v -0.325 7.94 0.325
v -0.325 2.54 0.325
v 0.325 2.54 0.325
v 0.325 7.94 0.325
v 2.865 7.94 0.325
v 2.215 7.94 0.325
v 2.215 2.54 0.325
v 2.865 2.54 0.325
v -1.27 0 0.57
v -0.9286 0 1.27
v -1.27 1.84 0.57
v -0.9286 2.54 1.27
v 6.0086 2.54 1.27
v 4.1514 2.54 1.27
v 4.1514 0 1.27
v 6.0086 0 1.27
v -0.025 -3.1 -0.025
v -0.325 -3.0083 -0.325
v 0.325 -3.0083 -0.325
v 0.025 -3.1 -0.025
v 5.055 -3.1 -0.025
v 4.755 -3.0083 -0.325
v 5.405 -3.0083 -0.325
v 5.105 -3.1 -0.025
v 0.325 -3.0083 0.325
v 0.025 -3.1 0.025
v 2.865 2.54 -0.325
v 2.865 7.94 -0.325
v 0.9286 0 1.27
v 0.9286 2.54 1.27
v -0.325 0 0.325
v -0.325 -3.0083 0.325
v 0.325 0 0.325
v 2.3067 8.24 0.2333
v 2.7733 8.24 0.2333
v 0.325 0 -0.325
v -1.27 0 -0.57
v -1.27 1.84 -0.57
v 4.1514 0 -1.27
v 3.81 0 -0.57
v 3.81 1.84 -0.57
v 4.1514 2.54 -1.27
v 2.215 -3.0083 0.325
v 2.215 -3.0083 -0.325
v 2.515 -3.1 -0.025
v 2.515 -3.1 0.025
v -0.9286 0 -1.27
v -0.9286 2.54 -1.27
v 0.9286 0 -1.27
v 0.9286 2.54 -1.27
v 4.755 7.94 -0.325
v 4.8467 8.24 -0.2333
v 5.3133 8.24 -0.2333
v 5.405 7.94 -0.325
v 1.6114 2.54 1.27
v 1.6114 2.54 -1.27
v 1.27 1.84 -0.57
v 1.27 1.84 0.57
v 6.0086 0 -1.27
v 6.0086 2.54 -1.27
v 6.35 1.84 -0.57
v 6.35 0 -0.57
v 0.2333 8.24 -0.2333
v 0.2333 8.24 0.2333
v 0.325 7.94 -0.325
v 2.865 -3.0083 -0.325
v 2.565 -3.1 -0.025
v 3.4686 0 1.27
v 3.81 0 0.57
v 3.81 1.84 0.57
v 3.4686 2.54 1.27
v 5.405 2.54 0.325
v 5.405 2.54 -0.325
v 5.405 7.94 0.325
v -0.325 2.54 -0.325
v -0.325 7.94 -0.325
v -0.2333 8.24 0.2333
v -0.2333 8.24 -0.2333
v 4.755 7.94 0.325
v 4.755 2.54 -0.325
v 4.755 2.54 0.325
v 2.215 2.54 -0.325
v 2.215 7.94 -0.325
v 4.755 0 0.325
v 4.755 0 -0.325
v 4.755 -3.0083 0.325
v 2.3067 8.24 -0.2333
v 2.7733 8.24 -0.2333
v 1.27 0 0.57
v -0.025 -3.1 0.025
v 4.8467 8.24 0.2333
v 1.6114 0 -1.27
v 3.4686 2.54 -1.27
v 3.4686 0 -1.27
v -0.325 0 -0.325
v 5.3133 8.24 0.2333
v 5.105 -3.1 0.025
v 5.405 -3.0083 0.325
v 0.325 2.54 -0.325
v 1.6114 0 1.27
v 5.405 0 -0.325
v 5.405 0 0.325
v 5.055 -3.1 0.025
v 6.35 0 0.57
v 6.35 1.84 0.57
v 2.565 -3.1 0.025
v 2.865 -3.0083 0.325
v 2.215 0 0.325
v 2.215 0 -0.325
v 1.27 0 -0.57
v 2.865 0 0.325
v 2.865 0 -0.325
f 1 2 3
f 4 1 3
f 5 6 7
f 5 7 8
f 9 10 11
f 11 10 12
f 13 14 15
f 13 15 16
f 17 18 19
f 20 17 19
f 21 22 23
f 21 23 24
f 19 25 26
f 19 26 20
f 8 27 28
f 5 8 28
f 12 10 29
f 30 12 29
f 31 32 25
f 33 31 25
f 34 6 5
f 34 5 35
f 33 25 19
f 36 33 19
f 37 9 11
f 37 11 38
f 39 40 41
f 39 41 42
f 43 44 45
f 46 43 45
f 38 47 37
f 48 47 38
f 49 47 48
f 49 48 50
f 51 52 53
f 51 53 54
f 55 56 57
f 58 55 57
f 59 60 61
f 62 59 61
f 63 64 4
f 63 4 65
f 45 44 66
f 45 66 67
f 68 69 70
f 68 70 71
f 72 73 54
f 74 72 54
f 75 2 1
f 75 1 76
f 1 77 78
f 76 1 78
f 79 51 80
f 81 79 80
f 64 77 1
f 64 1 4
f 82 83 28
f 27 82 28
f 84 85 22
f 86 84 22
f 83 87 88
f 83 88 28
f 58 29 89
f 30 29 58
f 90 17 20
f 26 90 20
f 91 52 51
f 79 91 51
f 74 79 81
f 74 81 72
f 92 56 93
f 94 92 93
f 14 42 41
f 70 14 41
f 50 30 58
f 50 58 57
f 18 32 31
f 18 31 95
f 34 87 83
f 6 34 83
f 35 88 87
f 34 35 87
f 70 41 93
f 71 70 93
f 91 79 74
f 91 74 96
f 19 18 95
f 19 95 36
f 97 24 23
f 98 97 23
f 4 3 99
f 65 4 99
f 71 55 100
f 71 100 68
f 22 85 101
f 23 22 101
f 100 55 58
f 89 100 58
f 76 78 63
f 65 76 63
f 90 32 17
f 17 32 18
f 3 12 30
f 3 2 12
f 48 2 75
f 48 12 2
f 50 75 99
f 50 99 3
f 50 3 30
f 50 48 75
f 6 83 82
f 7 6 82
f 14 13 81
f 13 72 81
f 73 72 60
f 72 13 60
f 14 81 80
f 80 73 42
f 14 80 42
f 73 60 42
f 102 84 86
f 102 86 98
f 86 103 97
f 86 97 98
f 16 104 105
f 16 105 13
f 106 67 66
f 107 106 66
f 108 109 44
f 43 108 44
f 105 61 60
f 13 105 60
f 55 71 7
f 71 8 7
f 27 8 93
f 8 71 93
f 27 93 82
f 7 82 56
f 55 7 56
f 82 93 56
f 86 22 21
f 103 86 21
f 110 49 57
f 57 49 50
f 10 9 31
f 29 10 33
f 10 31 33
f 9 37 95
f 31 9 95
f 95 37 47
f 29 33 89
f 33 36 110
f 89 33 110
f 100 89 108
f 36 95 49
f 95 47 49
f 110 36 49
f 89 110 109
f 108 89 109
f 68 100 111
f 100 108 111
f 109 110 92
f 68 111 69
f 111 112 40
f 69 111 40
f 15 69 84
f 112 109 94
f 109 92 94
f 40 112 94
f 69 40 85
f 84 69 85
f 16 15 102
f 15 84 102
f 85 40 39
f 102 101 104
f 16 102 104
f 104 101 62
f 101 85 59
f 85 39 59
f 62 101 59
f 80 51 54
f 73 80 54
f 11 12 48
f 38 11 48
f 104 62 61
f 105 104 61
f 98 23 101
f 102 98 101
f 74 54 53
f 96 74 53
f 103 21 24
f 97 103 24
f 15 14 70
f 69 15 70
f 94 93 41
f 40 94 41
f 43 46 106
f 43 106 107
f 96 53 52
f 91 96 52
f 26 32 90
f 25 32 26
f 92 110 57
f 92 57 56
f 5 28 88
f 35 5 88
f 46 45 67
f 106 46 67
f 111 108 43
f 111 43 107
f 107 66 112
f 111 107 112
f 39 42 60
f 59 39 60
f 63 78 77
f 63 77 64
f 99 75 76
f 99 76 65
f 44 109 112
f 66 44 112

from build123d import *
from OCP.BRepFilletAPI import BRepFilletAPI_MakeChamfer

# Parameters (mm, degrees)
SKETCH1_W                    = 2.54
SKETCH1_H                    = 2.54
BOSS_EXTRUDE1_DEPTH          = 2.54
BOSS_EXTRUDE2_START          = -5.64
SKETCH2_W                    = 0.65
SKETCH2_H                    = 0.65
BOSS_EXTRUDE2_DEPTH          = 11.34
CHAMFER1_SIZE                = 0.3
CHAMFER1_SIZE2               = 0.091719204
CHAMFER3_SIZE                = 0.7
CHAMFER3_SIZE2               = 0.341412812
CHAMFER4_SIZE                = 0.7
CHAMFER4_SIZE2               = 0.341412812
R_P_TITION_START             = -1.27
R_P_TITION_LIN_AIRE3_DEPTH   = 2.54
R_P_TITION_START_2           = -0.325
R_P_TITION_LIN_AIRE3_2_DEPTH = 0.65
R_P_TITION_START_3           = 1.611412812
R_P_TITION_LIN_AIRE3_3_DEPTH = 4.397174376
R_P_TITION_START_4           = -1
R_P_TITION_LIN_AIRE3_4_DEPTH = 5


with BuildPart() as part:
    # Sketch1 → Boss-Extrude1 (new body)
    with BuildSketch(Plane(origin=(0, 0, 0), x_dir=(1, 0, 0), z_dir=(0, 1, 0))):
        Rectangle(SKETCH1_W, SKETCH1_H)
    extrude(amount=BOSS_EXTRUDE1_DEPTH)

    # Sketch2 → Boss-Extrude2 (add)
    with BuildSketch(Plane(origin=(0, 2.54, 0), x_dir=(1, 0, 0), z_dir=(0, 1, 0)).offset(BOSS_EXTRUDE2_START)):
        Rectangle(SKETCH2_W, SKETCH2_H)
    extrude(amount=BOSS_EXTRUDE2_DEPTH)

    # Chamfer1: one chamfer whose edges measure the first distance from different faces: ONE call of the kernel's chamfer builder (chamfer() names one face for all edges)
    chamfer1_edges_1 = [part.edges().sort_by_distance(p)[0] for p in [
        (-0.325, -3.1, 0),
        (0, -3.1, -0.325),
        (0.325, -3.1, 0),
        (0, -3.1, 0.325),
    ]]
    chamfer1_side_1 = [part.faces().sort_by_distance(p)[0] for p in [
        (0, -3.1, 0),
    ]]
    chamfer1_edges_2 = [part.edges().sort_by_distance(p)[0] for p in [
        (-0.325, 8.24, 0),
    ]]
    chamfer1_side_2 = [part.faces().sort_by_distance(p)[0] for p in [
        (-0.325, 5.39, 0),
    ]]
    chamfer1_edges_3 = [part.edges().sort_by_distance(p)[0] for p in [
        (0, 8.24, 0.325),
    ]]
    chamfer1_side_3 = [part.faces().sort_by_distance(p)[0] for p in [
        (0, 5.39, 0.325),
    ]]
    chamfer1_edges_4 = [part.edges().sort_by_distance(p)[0] for p in [
        (0.325, 8.24, 0),
    ]]
    chamfer1_side_4 = [part.faces().sort_by_distance(p)[0] for p in [
        (0.325, 5.39, 0),
    ]]
    chamfer1_edges_5 = [part.edges().sort_by_distance(p)[0] for p in [
        (0, 8.24, -0.325),
    ]]
    chamfer1_side_5 = [part.faces().sort_by_distance(p)[0] for p in [
        (0, 5.39, -0.325),
    ]]
    chamfer1 = BRepFilletAPI_MakeChamfer(part.part.solid().wrapped)
    for e in chamfer1_edges_1:
        chamfer1.Add(CHAMFER1_SIZE, CHAMFER1_SIZE2, e.wrapped, chamfer1_side_1[0].wrapped)  # the first distance lies on this face
    for e in chamfer1_edges_2:
        chamfer1.Add(CHAMFER1_SIZE, CHAMFER1_SIZE2, e.wrapped, chamfer1_side_2[0].wrapped)  # the first distance lies on this face
    for e in chamfer1_edges_3:
        chamfer1.Add(CHAMFER1_SIZE, CHAMFER1_SIZE2, e.wrapped, chamfer1_side_3[0].wrapped)  # the first distance lies on this face
    for e in chamfer1_edges_4:
        chamfer1.Add(CHAMFER1_SIZE, CHAMFER1_SIZE2, e.wrapped, chamfer1_side_4[0].wrapped)  # the first distance lies on this face
    for e in chamfer1_edges_5:
        chamfer1.Add(CHAMFER1_SIZE, CHAMFER1_SIZE2, e.wrapped, chamfer1_side_5[0].wrapped)  # the first distance lies on this face
    add(Compound.cast(chamfer1.Shape()), mode=Mode.REPLACE)

    # Chamfer3
    chamfer3_edges = [part.edges().sort_by_distance(p)[0] for p in [
        (1.27, 2.54, 0),
        (1.27, 1.27, 1.27),
        (1.27, 1.27, -1.27),
    ]]
    chamfer3_side = [part.faces().sort_by_distance(p)[0] for p in [
        (1.27, 1.27, 0),
    ]]
    chamfer(chamfer3_edges, length=CHAMFER3_SIZE, length2=CHAMFER3_SIZE2, reference=chamfer3_side[0])

    # Chamfer4
    chamfer4_edges = [part.edges().sort_by_distance(p)[0] for p in [
        (-1.27, 2.54, 0),
        (-1.27, 1.27, 1.27),
        (-1.27, 1.27, -1.27),
    ]]
    chamfer4_side = [part.faces().sort_by_distance(p)[0] for p in [
        (-1.27, 1.27, 0),
    ]]
    chamfer(chamfer4_edges, length=CHAMFER4_SIZE, length2=CHAMFER4_SIZE2, reference=chamfer4_side[0])

    # Répétition linéaire3: read off the stored shape, not the designer's step
    # Répétition linéaire3 outline → Répétition linéaire3 (add)
    with BuildSketch(Plane.XY.offset(R_P_TITION_START)):
        Polygon((3.468587188, 2.54), (1.611412812, 2.54), (1.27, 1.84), (1.27, 0), (6.35, 0), (6.35, 1.84), (6.008587188, 2.54), (4.151412812, 2.54), (3.81, 1.84), align=None)
    extrude(amount=R_P_TITION_LIN_AIRE3_DEPTH)

    # R_p_tition lin_aire3 2 outline → R_p_tition lin_aire3 2 (add)
    with BuildSketch(Plane.XY.offset(R_P_TITION_START_2)):
        Polygon((2.215, 7.94), (2.215, 2.54), (2.865, 2.54), (2.865, 7.94), (2.773280796, 8.24), (2.306719204, 8.24), align=None)
        Polygon((2.865, 0), (2.215, 0), (2.215, -3.008280796), (2.515, -3.1), (2.565, -3.1), (2.865, -3.008280796), align=None)
        Polygon((5.405, 0), (4.755, 0), (4.755, -3.008280796), (5.055, -3.1), (5.105, -3.1), (5.405, -3.008280796), align=None)
        Polygon((4.755, 7.94), (4.755, 2.54), (5.405, 2.54), (5.405, 7.94), (5.313280796, 8.24), (4.846719204, 8.24), align=None)
    extrude(amount=R_P_TITION_LIN_AIRE3_2_DEPTH)

    # R_p_tition lin_aire3 3 outline → R_p_tition lin_aire3 3 (cut)
    with BuildSketch(Plane.YZ.offset(R_P_TITION_START_3)):
        Polygon((-3.1, 0.025), (-3.008280796, 0.325), (-3.1, 0.325), align=None)
        Polygon((-3.008280796, -0.325), (-3.1, -0.025), (-3.1, -0.325), align=None)
        Polygon((8.24, 0.325), (7.94, 0.325), (8.24, 0.233280796), align=None)
        Polygon((8.24, -0.325), (8.24, -0.233280796), (7.94, -0.325), align=None)
    extrude(amount=R_P_TITION_LIN_AIRE3_3_DEPTH, mode=Mode.SUBTRACT)

    # R_p_tition lin_aire3 4 outline → R_p_tition lin_aire3 4 (cut)
    with BuildSketch(Plane(origin=(0, 0, 0), x_dir=(1, 0, 0), z_dir=(0, 1, 0)).offset(R_P_TITION_START_4)):
        Polygon((4.151412812, -1.27), (3.81, -0.57), (3.468587188, -1.27), align=None)
        Polygon((1.27, 0.57), (1.611412812, 1.27), (1.27, 1.27), align=None)
        Polygon((3.81, 0.57), (4.151412812, 1.27), (3.468587188, 1.27), align=None)
        Polygon((6.008587188, 1.27), (6.35, 0.57), (6.35, 1.27), align=None)
        Polygon((6.35, -0.57), (6.008587188, -1.27), (6.35, -1.27), align=None)
        Polygon((1.27, -1.27), (1.611412812, -1.27), (1.27, -0.57), align=None)
    extrude(amount=R_P_TITION_LIN_AIRE3_4_DEPTH, mode=Mode.SUBTRACT)


solid = part.part
